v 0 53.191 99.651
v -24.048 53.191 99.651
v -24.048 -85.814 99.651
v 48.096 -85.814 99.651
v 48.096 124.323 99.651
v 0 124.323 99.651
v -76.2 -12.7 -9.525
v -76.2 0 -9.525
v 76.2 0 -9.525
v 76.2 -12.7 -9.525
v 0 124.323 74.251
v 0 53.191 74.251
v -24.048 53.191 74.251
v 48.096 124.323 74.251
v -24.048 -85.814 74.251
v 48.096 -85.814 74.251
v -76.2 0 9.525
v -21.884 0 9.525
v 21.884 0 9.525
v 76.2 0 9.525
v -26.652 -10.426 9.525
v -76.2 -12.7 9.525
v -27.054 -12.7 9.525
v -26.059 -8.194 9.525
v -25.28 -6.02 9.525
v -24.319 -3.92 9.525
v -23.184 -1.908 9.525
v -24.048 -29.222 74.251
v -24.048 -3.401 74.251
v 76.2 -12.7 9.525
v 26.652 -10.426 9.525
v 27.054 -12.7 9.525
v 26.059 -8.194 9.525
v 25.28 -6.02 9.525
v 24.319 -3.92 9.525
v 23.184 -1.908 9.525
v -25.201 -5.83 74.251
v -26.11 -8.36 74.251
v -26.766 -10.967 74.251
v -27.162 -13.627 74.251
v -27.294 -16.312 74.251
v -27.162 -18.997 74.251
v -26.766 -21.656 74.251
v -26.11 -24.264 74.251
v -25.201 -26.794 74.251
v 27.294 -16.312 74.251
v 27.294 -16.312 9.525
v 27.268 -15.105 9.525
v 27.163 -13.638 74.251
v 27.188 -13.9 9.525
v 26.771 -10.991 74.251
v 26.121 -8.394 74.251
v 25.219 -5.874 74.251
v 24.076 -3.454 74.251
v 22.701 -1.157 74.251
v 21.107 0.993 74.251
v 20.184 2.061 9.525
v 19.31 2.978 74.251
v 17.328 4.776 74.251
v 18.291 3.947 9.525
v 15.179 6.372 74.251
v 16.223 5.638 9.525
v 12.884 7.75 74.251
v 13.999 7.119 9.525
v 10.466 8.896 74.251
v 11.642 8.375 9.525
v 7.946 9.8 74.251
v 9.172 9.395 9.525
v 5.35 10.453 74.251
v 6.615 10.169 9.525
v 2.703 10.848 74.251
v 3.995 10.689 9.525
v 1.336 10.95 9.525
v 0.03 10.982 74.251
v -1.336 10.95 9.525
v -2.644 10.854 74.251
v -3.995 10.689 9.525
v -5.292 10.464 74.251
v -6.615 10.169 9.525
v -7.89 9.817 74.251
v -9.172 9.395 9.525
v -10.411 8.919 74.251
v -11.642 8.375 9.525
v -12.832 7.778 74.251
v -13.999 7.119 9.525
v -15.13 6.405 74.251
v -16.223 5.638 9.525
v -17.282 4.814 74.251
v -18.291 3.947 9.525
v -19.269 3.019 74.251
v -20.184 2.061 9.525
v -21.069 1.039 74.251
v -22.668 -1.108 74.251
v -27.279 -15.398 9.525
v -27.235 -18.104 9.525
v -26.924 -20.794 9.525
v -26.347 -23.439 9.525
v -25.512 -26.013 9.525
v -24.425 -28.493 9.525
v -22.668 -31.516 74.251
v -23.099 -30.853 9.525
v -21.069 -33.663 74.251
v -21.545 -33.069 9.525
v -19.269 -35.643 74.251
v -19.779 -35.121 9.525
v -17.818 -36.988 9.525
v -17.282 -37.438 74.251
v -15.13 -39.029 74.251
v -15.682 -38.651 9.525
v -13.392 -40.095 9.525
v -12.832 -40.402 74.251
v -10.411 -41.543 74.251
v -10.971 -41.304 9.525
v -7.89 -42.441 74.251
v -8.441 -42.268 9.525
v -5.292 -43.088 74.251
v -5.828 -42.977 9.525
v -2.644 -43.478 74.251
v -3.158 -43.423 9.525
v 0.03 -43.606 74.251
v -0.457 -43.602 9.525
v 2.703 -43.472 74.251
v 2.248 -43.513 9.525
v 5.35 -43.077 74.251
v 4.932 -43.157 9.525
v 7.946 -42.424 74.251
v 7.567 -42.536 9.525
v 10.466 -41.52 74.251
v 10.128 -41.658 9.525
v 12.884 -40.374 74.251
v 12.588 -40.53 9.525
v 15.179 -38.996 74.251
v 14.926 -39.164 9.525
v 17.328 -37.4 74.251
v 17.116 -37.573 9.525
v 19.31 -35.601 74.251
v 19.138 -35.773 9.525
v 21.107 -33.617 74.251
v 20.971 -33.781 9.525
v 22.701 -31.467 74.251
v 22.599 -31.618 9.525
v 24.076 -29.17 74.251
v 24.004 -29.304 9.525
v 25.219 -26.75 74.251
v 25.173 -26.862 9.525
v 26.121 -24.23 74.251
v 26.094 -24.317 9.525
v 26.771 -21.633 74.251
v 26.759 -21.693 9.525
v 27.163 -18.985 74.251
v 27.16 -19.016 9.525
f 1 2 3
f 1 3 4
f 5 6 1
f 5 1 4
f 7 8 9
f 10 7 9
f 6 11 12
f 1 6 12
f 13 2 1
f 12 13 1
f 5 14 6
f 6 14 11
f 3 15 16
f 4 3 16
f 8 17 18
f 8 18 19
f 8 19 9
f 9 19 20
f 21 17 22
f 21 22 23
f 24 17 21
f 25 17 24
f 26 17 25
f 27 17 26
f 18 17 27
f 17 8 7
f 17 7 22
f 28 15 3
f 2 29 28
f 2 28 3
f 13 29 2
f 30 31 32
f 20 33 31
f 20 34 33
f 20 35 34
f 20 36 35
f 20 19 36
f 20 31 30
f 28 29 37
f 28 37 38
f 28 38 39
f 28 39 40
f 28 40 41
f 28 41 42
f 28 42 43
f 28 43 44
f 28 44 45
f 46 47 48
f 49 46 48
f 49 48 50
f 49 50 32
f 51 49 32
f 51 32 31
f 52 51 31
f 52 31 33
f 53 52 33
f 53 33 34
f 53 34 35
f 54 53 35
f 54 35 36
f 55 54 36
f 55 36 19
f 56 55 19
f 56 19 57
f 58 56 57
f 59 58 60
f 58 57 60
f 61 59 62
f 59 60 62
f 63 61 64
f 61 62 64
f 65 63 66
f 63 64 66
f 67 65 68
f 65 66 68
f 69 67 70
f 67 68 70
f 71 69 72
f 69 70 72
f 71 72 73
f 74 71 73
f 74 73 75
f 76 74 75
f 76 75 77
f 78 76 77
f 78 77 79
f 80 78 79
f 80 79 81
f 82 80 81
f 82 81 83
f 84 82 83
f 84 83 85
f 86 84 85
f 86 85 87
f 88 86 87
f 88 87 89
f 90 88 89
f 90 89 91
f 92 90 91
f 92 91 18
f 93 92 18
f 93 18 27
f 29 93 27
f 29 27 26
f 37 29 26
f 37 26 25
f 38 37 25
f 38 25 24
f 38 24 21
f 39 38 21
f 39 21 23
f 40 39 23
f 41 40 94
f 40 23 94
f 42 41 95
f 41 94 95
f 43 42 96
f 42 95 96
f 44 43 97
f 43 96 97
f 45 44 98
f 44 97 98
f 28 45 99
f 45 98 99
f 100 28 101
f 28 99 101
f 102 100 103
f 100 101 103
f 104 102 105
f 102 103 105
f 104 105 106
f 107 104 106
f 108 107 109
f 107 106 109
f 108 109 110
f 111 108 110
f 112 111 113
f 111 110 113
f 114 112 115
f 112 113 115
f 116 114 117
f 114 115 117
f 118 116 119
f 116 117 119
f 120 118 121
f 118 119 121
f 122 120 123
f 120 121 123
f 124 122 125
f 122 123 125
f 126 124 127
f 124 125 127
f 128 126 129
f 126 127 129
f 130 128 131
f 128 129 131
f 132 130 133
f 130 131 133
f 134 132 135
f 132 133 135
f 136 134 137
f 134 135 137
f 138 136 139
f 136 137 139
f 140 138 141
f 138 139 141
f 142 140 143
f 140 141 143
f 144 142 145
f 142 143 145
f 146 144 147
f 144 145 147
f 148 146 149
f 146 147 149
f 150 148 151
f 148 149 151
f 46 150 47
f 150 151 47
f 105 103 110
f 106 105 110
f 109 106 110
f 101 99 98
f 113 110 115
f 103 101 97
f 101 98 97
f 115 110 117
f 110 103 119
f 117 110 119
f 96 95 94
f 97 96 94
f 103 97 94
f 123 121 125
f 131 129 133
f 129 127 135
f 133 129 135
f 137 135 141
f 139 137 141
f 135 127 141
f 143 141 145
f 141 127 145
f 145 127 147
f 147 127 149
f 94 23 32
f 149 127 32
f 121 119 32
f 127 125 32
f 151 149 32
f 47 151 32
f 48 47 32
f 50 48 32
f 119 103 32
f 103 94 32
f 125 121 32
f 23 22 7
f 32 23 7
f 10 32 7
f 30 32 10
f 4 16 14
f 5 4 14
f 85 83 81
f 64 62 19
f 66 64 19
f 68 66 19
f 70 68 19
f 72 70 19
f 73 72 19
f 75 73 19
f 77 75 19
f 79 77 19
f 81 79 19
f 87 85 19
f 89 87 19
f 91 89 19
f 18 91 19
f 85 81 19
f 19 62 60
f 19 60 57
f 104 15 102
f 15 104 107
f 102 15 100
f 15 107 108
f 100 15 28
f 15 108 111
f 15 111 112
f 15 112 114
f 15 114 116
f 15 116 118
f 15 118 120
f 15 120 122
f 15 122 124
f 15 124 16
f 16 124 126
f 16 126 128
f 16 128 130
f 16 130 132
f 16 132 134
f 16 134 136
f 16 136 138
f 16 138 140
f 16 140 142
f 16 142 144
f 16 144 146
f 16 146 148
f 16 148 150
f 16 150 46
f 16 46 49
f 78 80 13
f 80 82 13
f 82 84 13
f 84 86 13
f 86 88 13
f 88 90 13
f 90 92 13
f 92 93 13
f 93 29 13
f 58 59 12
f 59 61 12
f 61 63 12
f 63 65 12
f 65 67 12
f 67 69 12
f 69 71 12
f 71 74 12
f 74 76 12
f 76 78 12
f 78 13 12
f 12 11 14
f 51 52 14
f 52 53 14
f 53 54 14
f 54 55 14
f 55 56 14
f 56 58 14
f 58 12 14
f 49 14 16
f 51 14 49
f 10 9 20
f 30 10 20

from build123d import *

# Parameters (mm, degrees)
F0_W     = 152.4
F0_H     = 19.05
F1_DEPTH = 12.7
F2_R     = 27.294321
F3_DEPTH = 64.726328
F4_W     = 24.047904
F4_H     = 139.005154
F5_DEPTH = 25.4


with BuildPart() as f1:
    # F0 (on Front) → F1 (new body)
    with BuildSketch(Plane.XZ):
        Rectangle(F0_W, F0_H)
    extrude(amount=F1_DEPTH)

    # F2 (on face) → F3 (join)
    with BuildSketch(Plane.XY.offset(9.525)):
        with Locations((0, -16.311869)):
            Circle(F2_R)
    extrude(amount=F3_DEPTH)

    # F4 (on face) → F5 (join)
    with BuildSketch(Plane.XY.offset(74.251328)):
        with Locations((12.023952, -16.311869)):
            Rectangle(F4_W, F4_H)
        Polygon((24.047904, 53.190708), (24.047904, -85.814446), (48.095807, -85.814446), (48.095807, 124.323294), (0, 124.323294), (0, 53.190708), align=None)
        with Locations((-12.023952, -16.311869)):
            Rectangle(F4_W, F4_H)
    extrude(amount=F5_DEPTH)


solid = f1.part
